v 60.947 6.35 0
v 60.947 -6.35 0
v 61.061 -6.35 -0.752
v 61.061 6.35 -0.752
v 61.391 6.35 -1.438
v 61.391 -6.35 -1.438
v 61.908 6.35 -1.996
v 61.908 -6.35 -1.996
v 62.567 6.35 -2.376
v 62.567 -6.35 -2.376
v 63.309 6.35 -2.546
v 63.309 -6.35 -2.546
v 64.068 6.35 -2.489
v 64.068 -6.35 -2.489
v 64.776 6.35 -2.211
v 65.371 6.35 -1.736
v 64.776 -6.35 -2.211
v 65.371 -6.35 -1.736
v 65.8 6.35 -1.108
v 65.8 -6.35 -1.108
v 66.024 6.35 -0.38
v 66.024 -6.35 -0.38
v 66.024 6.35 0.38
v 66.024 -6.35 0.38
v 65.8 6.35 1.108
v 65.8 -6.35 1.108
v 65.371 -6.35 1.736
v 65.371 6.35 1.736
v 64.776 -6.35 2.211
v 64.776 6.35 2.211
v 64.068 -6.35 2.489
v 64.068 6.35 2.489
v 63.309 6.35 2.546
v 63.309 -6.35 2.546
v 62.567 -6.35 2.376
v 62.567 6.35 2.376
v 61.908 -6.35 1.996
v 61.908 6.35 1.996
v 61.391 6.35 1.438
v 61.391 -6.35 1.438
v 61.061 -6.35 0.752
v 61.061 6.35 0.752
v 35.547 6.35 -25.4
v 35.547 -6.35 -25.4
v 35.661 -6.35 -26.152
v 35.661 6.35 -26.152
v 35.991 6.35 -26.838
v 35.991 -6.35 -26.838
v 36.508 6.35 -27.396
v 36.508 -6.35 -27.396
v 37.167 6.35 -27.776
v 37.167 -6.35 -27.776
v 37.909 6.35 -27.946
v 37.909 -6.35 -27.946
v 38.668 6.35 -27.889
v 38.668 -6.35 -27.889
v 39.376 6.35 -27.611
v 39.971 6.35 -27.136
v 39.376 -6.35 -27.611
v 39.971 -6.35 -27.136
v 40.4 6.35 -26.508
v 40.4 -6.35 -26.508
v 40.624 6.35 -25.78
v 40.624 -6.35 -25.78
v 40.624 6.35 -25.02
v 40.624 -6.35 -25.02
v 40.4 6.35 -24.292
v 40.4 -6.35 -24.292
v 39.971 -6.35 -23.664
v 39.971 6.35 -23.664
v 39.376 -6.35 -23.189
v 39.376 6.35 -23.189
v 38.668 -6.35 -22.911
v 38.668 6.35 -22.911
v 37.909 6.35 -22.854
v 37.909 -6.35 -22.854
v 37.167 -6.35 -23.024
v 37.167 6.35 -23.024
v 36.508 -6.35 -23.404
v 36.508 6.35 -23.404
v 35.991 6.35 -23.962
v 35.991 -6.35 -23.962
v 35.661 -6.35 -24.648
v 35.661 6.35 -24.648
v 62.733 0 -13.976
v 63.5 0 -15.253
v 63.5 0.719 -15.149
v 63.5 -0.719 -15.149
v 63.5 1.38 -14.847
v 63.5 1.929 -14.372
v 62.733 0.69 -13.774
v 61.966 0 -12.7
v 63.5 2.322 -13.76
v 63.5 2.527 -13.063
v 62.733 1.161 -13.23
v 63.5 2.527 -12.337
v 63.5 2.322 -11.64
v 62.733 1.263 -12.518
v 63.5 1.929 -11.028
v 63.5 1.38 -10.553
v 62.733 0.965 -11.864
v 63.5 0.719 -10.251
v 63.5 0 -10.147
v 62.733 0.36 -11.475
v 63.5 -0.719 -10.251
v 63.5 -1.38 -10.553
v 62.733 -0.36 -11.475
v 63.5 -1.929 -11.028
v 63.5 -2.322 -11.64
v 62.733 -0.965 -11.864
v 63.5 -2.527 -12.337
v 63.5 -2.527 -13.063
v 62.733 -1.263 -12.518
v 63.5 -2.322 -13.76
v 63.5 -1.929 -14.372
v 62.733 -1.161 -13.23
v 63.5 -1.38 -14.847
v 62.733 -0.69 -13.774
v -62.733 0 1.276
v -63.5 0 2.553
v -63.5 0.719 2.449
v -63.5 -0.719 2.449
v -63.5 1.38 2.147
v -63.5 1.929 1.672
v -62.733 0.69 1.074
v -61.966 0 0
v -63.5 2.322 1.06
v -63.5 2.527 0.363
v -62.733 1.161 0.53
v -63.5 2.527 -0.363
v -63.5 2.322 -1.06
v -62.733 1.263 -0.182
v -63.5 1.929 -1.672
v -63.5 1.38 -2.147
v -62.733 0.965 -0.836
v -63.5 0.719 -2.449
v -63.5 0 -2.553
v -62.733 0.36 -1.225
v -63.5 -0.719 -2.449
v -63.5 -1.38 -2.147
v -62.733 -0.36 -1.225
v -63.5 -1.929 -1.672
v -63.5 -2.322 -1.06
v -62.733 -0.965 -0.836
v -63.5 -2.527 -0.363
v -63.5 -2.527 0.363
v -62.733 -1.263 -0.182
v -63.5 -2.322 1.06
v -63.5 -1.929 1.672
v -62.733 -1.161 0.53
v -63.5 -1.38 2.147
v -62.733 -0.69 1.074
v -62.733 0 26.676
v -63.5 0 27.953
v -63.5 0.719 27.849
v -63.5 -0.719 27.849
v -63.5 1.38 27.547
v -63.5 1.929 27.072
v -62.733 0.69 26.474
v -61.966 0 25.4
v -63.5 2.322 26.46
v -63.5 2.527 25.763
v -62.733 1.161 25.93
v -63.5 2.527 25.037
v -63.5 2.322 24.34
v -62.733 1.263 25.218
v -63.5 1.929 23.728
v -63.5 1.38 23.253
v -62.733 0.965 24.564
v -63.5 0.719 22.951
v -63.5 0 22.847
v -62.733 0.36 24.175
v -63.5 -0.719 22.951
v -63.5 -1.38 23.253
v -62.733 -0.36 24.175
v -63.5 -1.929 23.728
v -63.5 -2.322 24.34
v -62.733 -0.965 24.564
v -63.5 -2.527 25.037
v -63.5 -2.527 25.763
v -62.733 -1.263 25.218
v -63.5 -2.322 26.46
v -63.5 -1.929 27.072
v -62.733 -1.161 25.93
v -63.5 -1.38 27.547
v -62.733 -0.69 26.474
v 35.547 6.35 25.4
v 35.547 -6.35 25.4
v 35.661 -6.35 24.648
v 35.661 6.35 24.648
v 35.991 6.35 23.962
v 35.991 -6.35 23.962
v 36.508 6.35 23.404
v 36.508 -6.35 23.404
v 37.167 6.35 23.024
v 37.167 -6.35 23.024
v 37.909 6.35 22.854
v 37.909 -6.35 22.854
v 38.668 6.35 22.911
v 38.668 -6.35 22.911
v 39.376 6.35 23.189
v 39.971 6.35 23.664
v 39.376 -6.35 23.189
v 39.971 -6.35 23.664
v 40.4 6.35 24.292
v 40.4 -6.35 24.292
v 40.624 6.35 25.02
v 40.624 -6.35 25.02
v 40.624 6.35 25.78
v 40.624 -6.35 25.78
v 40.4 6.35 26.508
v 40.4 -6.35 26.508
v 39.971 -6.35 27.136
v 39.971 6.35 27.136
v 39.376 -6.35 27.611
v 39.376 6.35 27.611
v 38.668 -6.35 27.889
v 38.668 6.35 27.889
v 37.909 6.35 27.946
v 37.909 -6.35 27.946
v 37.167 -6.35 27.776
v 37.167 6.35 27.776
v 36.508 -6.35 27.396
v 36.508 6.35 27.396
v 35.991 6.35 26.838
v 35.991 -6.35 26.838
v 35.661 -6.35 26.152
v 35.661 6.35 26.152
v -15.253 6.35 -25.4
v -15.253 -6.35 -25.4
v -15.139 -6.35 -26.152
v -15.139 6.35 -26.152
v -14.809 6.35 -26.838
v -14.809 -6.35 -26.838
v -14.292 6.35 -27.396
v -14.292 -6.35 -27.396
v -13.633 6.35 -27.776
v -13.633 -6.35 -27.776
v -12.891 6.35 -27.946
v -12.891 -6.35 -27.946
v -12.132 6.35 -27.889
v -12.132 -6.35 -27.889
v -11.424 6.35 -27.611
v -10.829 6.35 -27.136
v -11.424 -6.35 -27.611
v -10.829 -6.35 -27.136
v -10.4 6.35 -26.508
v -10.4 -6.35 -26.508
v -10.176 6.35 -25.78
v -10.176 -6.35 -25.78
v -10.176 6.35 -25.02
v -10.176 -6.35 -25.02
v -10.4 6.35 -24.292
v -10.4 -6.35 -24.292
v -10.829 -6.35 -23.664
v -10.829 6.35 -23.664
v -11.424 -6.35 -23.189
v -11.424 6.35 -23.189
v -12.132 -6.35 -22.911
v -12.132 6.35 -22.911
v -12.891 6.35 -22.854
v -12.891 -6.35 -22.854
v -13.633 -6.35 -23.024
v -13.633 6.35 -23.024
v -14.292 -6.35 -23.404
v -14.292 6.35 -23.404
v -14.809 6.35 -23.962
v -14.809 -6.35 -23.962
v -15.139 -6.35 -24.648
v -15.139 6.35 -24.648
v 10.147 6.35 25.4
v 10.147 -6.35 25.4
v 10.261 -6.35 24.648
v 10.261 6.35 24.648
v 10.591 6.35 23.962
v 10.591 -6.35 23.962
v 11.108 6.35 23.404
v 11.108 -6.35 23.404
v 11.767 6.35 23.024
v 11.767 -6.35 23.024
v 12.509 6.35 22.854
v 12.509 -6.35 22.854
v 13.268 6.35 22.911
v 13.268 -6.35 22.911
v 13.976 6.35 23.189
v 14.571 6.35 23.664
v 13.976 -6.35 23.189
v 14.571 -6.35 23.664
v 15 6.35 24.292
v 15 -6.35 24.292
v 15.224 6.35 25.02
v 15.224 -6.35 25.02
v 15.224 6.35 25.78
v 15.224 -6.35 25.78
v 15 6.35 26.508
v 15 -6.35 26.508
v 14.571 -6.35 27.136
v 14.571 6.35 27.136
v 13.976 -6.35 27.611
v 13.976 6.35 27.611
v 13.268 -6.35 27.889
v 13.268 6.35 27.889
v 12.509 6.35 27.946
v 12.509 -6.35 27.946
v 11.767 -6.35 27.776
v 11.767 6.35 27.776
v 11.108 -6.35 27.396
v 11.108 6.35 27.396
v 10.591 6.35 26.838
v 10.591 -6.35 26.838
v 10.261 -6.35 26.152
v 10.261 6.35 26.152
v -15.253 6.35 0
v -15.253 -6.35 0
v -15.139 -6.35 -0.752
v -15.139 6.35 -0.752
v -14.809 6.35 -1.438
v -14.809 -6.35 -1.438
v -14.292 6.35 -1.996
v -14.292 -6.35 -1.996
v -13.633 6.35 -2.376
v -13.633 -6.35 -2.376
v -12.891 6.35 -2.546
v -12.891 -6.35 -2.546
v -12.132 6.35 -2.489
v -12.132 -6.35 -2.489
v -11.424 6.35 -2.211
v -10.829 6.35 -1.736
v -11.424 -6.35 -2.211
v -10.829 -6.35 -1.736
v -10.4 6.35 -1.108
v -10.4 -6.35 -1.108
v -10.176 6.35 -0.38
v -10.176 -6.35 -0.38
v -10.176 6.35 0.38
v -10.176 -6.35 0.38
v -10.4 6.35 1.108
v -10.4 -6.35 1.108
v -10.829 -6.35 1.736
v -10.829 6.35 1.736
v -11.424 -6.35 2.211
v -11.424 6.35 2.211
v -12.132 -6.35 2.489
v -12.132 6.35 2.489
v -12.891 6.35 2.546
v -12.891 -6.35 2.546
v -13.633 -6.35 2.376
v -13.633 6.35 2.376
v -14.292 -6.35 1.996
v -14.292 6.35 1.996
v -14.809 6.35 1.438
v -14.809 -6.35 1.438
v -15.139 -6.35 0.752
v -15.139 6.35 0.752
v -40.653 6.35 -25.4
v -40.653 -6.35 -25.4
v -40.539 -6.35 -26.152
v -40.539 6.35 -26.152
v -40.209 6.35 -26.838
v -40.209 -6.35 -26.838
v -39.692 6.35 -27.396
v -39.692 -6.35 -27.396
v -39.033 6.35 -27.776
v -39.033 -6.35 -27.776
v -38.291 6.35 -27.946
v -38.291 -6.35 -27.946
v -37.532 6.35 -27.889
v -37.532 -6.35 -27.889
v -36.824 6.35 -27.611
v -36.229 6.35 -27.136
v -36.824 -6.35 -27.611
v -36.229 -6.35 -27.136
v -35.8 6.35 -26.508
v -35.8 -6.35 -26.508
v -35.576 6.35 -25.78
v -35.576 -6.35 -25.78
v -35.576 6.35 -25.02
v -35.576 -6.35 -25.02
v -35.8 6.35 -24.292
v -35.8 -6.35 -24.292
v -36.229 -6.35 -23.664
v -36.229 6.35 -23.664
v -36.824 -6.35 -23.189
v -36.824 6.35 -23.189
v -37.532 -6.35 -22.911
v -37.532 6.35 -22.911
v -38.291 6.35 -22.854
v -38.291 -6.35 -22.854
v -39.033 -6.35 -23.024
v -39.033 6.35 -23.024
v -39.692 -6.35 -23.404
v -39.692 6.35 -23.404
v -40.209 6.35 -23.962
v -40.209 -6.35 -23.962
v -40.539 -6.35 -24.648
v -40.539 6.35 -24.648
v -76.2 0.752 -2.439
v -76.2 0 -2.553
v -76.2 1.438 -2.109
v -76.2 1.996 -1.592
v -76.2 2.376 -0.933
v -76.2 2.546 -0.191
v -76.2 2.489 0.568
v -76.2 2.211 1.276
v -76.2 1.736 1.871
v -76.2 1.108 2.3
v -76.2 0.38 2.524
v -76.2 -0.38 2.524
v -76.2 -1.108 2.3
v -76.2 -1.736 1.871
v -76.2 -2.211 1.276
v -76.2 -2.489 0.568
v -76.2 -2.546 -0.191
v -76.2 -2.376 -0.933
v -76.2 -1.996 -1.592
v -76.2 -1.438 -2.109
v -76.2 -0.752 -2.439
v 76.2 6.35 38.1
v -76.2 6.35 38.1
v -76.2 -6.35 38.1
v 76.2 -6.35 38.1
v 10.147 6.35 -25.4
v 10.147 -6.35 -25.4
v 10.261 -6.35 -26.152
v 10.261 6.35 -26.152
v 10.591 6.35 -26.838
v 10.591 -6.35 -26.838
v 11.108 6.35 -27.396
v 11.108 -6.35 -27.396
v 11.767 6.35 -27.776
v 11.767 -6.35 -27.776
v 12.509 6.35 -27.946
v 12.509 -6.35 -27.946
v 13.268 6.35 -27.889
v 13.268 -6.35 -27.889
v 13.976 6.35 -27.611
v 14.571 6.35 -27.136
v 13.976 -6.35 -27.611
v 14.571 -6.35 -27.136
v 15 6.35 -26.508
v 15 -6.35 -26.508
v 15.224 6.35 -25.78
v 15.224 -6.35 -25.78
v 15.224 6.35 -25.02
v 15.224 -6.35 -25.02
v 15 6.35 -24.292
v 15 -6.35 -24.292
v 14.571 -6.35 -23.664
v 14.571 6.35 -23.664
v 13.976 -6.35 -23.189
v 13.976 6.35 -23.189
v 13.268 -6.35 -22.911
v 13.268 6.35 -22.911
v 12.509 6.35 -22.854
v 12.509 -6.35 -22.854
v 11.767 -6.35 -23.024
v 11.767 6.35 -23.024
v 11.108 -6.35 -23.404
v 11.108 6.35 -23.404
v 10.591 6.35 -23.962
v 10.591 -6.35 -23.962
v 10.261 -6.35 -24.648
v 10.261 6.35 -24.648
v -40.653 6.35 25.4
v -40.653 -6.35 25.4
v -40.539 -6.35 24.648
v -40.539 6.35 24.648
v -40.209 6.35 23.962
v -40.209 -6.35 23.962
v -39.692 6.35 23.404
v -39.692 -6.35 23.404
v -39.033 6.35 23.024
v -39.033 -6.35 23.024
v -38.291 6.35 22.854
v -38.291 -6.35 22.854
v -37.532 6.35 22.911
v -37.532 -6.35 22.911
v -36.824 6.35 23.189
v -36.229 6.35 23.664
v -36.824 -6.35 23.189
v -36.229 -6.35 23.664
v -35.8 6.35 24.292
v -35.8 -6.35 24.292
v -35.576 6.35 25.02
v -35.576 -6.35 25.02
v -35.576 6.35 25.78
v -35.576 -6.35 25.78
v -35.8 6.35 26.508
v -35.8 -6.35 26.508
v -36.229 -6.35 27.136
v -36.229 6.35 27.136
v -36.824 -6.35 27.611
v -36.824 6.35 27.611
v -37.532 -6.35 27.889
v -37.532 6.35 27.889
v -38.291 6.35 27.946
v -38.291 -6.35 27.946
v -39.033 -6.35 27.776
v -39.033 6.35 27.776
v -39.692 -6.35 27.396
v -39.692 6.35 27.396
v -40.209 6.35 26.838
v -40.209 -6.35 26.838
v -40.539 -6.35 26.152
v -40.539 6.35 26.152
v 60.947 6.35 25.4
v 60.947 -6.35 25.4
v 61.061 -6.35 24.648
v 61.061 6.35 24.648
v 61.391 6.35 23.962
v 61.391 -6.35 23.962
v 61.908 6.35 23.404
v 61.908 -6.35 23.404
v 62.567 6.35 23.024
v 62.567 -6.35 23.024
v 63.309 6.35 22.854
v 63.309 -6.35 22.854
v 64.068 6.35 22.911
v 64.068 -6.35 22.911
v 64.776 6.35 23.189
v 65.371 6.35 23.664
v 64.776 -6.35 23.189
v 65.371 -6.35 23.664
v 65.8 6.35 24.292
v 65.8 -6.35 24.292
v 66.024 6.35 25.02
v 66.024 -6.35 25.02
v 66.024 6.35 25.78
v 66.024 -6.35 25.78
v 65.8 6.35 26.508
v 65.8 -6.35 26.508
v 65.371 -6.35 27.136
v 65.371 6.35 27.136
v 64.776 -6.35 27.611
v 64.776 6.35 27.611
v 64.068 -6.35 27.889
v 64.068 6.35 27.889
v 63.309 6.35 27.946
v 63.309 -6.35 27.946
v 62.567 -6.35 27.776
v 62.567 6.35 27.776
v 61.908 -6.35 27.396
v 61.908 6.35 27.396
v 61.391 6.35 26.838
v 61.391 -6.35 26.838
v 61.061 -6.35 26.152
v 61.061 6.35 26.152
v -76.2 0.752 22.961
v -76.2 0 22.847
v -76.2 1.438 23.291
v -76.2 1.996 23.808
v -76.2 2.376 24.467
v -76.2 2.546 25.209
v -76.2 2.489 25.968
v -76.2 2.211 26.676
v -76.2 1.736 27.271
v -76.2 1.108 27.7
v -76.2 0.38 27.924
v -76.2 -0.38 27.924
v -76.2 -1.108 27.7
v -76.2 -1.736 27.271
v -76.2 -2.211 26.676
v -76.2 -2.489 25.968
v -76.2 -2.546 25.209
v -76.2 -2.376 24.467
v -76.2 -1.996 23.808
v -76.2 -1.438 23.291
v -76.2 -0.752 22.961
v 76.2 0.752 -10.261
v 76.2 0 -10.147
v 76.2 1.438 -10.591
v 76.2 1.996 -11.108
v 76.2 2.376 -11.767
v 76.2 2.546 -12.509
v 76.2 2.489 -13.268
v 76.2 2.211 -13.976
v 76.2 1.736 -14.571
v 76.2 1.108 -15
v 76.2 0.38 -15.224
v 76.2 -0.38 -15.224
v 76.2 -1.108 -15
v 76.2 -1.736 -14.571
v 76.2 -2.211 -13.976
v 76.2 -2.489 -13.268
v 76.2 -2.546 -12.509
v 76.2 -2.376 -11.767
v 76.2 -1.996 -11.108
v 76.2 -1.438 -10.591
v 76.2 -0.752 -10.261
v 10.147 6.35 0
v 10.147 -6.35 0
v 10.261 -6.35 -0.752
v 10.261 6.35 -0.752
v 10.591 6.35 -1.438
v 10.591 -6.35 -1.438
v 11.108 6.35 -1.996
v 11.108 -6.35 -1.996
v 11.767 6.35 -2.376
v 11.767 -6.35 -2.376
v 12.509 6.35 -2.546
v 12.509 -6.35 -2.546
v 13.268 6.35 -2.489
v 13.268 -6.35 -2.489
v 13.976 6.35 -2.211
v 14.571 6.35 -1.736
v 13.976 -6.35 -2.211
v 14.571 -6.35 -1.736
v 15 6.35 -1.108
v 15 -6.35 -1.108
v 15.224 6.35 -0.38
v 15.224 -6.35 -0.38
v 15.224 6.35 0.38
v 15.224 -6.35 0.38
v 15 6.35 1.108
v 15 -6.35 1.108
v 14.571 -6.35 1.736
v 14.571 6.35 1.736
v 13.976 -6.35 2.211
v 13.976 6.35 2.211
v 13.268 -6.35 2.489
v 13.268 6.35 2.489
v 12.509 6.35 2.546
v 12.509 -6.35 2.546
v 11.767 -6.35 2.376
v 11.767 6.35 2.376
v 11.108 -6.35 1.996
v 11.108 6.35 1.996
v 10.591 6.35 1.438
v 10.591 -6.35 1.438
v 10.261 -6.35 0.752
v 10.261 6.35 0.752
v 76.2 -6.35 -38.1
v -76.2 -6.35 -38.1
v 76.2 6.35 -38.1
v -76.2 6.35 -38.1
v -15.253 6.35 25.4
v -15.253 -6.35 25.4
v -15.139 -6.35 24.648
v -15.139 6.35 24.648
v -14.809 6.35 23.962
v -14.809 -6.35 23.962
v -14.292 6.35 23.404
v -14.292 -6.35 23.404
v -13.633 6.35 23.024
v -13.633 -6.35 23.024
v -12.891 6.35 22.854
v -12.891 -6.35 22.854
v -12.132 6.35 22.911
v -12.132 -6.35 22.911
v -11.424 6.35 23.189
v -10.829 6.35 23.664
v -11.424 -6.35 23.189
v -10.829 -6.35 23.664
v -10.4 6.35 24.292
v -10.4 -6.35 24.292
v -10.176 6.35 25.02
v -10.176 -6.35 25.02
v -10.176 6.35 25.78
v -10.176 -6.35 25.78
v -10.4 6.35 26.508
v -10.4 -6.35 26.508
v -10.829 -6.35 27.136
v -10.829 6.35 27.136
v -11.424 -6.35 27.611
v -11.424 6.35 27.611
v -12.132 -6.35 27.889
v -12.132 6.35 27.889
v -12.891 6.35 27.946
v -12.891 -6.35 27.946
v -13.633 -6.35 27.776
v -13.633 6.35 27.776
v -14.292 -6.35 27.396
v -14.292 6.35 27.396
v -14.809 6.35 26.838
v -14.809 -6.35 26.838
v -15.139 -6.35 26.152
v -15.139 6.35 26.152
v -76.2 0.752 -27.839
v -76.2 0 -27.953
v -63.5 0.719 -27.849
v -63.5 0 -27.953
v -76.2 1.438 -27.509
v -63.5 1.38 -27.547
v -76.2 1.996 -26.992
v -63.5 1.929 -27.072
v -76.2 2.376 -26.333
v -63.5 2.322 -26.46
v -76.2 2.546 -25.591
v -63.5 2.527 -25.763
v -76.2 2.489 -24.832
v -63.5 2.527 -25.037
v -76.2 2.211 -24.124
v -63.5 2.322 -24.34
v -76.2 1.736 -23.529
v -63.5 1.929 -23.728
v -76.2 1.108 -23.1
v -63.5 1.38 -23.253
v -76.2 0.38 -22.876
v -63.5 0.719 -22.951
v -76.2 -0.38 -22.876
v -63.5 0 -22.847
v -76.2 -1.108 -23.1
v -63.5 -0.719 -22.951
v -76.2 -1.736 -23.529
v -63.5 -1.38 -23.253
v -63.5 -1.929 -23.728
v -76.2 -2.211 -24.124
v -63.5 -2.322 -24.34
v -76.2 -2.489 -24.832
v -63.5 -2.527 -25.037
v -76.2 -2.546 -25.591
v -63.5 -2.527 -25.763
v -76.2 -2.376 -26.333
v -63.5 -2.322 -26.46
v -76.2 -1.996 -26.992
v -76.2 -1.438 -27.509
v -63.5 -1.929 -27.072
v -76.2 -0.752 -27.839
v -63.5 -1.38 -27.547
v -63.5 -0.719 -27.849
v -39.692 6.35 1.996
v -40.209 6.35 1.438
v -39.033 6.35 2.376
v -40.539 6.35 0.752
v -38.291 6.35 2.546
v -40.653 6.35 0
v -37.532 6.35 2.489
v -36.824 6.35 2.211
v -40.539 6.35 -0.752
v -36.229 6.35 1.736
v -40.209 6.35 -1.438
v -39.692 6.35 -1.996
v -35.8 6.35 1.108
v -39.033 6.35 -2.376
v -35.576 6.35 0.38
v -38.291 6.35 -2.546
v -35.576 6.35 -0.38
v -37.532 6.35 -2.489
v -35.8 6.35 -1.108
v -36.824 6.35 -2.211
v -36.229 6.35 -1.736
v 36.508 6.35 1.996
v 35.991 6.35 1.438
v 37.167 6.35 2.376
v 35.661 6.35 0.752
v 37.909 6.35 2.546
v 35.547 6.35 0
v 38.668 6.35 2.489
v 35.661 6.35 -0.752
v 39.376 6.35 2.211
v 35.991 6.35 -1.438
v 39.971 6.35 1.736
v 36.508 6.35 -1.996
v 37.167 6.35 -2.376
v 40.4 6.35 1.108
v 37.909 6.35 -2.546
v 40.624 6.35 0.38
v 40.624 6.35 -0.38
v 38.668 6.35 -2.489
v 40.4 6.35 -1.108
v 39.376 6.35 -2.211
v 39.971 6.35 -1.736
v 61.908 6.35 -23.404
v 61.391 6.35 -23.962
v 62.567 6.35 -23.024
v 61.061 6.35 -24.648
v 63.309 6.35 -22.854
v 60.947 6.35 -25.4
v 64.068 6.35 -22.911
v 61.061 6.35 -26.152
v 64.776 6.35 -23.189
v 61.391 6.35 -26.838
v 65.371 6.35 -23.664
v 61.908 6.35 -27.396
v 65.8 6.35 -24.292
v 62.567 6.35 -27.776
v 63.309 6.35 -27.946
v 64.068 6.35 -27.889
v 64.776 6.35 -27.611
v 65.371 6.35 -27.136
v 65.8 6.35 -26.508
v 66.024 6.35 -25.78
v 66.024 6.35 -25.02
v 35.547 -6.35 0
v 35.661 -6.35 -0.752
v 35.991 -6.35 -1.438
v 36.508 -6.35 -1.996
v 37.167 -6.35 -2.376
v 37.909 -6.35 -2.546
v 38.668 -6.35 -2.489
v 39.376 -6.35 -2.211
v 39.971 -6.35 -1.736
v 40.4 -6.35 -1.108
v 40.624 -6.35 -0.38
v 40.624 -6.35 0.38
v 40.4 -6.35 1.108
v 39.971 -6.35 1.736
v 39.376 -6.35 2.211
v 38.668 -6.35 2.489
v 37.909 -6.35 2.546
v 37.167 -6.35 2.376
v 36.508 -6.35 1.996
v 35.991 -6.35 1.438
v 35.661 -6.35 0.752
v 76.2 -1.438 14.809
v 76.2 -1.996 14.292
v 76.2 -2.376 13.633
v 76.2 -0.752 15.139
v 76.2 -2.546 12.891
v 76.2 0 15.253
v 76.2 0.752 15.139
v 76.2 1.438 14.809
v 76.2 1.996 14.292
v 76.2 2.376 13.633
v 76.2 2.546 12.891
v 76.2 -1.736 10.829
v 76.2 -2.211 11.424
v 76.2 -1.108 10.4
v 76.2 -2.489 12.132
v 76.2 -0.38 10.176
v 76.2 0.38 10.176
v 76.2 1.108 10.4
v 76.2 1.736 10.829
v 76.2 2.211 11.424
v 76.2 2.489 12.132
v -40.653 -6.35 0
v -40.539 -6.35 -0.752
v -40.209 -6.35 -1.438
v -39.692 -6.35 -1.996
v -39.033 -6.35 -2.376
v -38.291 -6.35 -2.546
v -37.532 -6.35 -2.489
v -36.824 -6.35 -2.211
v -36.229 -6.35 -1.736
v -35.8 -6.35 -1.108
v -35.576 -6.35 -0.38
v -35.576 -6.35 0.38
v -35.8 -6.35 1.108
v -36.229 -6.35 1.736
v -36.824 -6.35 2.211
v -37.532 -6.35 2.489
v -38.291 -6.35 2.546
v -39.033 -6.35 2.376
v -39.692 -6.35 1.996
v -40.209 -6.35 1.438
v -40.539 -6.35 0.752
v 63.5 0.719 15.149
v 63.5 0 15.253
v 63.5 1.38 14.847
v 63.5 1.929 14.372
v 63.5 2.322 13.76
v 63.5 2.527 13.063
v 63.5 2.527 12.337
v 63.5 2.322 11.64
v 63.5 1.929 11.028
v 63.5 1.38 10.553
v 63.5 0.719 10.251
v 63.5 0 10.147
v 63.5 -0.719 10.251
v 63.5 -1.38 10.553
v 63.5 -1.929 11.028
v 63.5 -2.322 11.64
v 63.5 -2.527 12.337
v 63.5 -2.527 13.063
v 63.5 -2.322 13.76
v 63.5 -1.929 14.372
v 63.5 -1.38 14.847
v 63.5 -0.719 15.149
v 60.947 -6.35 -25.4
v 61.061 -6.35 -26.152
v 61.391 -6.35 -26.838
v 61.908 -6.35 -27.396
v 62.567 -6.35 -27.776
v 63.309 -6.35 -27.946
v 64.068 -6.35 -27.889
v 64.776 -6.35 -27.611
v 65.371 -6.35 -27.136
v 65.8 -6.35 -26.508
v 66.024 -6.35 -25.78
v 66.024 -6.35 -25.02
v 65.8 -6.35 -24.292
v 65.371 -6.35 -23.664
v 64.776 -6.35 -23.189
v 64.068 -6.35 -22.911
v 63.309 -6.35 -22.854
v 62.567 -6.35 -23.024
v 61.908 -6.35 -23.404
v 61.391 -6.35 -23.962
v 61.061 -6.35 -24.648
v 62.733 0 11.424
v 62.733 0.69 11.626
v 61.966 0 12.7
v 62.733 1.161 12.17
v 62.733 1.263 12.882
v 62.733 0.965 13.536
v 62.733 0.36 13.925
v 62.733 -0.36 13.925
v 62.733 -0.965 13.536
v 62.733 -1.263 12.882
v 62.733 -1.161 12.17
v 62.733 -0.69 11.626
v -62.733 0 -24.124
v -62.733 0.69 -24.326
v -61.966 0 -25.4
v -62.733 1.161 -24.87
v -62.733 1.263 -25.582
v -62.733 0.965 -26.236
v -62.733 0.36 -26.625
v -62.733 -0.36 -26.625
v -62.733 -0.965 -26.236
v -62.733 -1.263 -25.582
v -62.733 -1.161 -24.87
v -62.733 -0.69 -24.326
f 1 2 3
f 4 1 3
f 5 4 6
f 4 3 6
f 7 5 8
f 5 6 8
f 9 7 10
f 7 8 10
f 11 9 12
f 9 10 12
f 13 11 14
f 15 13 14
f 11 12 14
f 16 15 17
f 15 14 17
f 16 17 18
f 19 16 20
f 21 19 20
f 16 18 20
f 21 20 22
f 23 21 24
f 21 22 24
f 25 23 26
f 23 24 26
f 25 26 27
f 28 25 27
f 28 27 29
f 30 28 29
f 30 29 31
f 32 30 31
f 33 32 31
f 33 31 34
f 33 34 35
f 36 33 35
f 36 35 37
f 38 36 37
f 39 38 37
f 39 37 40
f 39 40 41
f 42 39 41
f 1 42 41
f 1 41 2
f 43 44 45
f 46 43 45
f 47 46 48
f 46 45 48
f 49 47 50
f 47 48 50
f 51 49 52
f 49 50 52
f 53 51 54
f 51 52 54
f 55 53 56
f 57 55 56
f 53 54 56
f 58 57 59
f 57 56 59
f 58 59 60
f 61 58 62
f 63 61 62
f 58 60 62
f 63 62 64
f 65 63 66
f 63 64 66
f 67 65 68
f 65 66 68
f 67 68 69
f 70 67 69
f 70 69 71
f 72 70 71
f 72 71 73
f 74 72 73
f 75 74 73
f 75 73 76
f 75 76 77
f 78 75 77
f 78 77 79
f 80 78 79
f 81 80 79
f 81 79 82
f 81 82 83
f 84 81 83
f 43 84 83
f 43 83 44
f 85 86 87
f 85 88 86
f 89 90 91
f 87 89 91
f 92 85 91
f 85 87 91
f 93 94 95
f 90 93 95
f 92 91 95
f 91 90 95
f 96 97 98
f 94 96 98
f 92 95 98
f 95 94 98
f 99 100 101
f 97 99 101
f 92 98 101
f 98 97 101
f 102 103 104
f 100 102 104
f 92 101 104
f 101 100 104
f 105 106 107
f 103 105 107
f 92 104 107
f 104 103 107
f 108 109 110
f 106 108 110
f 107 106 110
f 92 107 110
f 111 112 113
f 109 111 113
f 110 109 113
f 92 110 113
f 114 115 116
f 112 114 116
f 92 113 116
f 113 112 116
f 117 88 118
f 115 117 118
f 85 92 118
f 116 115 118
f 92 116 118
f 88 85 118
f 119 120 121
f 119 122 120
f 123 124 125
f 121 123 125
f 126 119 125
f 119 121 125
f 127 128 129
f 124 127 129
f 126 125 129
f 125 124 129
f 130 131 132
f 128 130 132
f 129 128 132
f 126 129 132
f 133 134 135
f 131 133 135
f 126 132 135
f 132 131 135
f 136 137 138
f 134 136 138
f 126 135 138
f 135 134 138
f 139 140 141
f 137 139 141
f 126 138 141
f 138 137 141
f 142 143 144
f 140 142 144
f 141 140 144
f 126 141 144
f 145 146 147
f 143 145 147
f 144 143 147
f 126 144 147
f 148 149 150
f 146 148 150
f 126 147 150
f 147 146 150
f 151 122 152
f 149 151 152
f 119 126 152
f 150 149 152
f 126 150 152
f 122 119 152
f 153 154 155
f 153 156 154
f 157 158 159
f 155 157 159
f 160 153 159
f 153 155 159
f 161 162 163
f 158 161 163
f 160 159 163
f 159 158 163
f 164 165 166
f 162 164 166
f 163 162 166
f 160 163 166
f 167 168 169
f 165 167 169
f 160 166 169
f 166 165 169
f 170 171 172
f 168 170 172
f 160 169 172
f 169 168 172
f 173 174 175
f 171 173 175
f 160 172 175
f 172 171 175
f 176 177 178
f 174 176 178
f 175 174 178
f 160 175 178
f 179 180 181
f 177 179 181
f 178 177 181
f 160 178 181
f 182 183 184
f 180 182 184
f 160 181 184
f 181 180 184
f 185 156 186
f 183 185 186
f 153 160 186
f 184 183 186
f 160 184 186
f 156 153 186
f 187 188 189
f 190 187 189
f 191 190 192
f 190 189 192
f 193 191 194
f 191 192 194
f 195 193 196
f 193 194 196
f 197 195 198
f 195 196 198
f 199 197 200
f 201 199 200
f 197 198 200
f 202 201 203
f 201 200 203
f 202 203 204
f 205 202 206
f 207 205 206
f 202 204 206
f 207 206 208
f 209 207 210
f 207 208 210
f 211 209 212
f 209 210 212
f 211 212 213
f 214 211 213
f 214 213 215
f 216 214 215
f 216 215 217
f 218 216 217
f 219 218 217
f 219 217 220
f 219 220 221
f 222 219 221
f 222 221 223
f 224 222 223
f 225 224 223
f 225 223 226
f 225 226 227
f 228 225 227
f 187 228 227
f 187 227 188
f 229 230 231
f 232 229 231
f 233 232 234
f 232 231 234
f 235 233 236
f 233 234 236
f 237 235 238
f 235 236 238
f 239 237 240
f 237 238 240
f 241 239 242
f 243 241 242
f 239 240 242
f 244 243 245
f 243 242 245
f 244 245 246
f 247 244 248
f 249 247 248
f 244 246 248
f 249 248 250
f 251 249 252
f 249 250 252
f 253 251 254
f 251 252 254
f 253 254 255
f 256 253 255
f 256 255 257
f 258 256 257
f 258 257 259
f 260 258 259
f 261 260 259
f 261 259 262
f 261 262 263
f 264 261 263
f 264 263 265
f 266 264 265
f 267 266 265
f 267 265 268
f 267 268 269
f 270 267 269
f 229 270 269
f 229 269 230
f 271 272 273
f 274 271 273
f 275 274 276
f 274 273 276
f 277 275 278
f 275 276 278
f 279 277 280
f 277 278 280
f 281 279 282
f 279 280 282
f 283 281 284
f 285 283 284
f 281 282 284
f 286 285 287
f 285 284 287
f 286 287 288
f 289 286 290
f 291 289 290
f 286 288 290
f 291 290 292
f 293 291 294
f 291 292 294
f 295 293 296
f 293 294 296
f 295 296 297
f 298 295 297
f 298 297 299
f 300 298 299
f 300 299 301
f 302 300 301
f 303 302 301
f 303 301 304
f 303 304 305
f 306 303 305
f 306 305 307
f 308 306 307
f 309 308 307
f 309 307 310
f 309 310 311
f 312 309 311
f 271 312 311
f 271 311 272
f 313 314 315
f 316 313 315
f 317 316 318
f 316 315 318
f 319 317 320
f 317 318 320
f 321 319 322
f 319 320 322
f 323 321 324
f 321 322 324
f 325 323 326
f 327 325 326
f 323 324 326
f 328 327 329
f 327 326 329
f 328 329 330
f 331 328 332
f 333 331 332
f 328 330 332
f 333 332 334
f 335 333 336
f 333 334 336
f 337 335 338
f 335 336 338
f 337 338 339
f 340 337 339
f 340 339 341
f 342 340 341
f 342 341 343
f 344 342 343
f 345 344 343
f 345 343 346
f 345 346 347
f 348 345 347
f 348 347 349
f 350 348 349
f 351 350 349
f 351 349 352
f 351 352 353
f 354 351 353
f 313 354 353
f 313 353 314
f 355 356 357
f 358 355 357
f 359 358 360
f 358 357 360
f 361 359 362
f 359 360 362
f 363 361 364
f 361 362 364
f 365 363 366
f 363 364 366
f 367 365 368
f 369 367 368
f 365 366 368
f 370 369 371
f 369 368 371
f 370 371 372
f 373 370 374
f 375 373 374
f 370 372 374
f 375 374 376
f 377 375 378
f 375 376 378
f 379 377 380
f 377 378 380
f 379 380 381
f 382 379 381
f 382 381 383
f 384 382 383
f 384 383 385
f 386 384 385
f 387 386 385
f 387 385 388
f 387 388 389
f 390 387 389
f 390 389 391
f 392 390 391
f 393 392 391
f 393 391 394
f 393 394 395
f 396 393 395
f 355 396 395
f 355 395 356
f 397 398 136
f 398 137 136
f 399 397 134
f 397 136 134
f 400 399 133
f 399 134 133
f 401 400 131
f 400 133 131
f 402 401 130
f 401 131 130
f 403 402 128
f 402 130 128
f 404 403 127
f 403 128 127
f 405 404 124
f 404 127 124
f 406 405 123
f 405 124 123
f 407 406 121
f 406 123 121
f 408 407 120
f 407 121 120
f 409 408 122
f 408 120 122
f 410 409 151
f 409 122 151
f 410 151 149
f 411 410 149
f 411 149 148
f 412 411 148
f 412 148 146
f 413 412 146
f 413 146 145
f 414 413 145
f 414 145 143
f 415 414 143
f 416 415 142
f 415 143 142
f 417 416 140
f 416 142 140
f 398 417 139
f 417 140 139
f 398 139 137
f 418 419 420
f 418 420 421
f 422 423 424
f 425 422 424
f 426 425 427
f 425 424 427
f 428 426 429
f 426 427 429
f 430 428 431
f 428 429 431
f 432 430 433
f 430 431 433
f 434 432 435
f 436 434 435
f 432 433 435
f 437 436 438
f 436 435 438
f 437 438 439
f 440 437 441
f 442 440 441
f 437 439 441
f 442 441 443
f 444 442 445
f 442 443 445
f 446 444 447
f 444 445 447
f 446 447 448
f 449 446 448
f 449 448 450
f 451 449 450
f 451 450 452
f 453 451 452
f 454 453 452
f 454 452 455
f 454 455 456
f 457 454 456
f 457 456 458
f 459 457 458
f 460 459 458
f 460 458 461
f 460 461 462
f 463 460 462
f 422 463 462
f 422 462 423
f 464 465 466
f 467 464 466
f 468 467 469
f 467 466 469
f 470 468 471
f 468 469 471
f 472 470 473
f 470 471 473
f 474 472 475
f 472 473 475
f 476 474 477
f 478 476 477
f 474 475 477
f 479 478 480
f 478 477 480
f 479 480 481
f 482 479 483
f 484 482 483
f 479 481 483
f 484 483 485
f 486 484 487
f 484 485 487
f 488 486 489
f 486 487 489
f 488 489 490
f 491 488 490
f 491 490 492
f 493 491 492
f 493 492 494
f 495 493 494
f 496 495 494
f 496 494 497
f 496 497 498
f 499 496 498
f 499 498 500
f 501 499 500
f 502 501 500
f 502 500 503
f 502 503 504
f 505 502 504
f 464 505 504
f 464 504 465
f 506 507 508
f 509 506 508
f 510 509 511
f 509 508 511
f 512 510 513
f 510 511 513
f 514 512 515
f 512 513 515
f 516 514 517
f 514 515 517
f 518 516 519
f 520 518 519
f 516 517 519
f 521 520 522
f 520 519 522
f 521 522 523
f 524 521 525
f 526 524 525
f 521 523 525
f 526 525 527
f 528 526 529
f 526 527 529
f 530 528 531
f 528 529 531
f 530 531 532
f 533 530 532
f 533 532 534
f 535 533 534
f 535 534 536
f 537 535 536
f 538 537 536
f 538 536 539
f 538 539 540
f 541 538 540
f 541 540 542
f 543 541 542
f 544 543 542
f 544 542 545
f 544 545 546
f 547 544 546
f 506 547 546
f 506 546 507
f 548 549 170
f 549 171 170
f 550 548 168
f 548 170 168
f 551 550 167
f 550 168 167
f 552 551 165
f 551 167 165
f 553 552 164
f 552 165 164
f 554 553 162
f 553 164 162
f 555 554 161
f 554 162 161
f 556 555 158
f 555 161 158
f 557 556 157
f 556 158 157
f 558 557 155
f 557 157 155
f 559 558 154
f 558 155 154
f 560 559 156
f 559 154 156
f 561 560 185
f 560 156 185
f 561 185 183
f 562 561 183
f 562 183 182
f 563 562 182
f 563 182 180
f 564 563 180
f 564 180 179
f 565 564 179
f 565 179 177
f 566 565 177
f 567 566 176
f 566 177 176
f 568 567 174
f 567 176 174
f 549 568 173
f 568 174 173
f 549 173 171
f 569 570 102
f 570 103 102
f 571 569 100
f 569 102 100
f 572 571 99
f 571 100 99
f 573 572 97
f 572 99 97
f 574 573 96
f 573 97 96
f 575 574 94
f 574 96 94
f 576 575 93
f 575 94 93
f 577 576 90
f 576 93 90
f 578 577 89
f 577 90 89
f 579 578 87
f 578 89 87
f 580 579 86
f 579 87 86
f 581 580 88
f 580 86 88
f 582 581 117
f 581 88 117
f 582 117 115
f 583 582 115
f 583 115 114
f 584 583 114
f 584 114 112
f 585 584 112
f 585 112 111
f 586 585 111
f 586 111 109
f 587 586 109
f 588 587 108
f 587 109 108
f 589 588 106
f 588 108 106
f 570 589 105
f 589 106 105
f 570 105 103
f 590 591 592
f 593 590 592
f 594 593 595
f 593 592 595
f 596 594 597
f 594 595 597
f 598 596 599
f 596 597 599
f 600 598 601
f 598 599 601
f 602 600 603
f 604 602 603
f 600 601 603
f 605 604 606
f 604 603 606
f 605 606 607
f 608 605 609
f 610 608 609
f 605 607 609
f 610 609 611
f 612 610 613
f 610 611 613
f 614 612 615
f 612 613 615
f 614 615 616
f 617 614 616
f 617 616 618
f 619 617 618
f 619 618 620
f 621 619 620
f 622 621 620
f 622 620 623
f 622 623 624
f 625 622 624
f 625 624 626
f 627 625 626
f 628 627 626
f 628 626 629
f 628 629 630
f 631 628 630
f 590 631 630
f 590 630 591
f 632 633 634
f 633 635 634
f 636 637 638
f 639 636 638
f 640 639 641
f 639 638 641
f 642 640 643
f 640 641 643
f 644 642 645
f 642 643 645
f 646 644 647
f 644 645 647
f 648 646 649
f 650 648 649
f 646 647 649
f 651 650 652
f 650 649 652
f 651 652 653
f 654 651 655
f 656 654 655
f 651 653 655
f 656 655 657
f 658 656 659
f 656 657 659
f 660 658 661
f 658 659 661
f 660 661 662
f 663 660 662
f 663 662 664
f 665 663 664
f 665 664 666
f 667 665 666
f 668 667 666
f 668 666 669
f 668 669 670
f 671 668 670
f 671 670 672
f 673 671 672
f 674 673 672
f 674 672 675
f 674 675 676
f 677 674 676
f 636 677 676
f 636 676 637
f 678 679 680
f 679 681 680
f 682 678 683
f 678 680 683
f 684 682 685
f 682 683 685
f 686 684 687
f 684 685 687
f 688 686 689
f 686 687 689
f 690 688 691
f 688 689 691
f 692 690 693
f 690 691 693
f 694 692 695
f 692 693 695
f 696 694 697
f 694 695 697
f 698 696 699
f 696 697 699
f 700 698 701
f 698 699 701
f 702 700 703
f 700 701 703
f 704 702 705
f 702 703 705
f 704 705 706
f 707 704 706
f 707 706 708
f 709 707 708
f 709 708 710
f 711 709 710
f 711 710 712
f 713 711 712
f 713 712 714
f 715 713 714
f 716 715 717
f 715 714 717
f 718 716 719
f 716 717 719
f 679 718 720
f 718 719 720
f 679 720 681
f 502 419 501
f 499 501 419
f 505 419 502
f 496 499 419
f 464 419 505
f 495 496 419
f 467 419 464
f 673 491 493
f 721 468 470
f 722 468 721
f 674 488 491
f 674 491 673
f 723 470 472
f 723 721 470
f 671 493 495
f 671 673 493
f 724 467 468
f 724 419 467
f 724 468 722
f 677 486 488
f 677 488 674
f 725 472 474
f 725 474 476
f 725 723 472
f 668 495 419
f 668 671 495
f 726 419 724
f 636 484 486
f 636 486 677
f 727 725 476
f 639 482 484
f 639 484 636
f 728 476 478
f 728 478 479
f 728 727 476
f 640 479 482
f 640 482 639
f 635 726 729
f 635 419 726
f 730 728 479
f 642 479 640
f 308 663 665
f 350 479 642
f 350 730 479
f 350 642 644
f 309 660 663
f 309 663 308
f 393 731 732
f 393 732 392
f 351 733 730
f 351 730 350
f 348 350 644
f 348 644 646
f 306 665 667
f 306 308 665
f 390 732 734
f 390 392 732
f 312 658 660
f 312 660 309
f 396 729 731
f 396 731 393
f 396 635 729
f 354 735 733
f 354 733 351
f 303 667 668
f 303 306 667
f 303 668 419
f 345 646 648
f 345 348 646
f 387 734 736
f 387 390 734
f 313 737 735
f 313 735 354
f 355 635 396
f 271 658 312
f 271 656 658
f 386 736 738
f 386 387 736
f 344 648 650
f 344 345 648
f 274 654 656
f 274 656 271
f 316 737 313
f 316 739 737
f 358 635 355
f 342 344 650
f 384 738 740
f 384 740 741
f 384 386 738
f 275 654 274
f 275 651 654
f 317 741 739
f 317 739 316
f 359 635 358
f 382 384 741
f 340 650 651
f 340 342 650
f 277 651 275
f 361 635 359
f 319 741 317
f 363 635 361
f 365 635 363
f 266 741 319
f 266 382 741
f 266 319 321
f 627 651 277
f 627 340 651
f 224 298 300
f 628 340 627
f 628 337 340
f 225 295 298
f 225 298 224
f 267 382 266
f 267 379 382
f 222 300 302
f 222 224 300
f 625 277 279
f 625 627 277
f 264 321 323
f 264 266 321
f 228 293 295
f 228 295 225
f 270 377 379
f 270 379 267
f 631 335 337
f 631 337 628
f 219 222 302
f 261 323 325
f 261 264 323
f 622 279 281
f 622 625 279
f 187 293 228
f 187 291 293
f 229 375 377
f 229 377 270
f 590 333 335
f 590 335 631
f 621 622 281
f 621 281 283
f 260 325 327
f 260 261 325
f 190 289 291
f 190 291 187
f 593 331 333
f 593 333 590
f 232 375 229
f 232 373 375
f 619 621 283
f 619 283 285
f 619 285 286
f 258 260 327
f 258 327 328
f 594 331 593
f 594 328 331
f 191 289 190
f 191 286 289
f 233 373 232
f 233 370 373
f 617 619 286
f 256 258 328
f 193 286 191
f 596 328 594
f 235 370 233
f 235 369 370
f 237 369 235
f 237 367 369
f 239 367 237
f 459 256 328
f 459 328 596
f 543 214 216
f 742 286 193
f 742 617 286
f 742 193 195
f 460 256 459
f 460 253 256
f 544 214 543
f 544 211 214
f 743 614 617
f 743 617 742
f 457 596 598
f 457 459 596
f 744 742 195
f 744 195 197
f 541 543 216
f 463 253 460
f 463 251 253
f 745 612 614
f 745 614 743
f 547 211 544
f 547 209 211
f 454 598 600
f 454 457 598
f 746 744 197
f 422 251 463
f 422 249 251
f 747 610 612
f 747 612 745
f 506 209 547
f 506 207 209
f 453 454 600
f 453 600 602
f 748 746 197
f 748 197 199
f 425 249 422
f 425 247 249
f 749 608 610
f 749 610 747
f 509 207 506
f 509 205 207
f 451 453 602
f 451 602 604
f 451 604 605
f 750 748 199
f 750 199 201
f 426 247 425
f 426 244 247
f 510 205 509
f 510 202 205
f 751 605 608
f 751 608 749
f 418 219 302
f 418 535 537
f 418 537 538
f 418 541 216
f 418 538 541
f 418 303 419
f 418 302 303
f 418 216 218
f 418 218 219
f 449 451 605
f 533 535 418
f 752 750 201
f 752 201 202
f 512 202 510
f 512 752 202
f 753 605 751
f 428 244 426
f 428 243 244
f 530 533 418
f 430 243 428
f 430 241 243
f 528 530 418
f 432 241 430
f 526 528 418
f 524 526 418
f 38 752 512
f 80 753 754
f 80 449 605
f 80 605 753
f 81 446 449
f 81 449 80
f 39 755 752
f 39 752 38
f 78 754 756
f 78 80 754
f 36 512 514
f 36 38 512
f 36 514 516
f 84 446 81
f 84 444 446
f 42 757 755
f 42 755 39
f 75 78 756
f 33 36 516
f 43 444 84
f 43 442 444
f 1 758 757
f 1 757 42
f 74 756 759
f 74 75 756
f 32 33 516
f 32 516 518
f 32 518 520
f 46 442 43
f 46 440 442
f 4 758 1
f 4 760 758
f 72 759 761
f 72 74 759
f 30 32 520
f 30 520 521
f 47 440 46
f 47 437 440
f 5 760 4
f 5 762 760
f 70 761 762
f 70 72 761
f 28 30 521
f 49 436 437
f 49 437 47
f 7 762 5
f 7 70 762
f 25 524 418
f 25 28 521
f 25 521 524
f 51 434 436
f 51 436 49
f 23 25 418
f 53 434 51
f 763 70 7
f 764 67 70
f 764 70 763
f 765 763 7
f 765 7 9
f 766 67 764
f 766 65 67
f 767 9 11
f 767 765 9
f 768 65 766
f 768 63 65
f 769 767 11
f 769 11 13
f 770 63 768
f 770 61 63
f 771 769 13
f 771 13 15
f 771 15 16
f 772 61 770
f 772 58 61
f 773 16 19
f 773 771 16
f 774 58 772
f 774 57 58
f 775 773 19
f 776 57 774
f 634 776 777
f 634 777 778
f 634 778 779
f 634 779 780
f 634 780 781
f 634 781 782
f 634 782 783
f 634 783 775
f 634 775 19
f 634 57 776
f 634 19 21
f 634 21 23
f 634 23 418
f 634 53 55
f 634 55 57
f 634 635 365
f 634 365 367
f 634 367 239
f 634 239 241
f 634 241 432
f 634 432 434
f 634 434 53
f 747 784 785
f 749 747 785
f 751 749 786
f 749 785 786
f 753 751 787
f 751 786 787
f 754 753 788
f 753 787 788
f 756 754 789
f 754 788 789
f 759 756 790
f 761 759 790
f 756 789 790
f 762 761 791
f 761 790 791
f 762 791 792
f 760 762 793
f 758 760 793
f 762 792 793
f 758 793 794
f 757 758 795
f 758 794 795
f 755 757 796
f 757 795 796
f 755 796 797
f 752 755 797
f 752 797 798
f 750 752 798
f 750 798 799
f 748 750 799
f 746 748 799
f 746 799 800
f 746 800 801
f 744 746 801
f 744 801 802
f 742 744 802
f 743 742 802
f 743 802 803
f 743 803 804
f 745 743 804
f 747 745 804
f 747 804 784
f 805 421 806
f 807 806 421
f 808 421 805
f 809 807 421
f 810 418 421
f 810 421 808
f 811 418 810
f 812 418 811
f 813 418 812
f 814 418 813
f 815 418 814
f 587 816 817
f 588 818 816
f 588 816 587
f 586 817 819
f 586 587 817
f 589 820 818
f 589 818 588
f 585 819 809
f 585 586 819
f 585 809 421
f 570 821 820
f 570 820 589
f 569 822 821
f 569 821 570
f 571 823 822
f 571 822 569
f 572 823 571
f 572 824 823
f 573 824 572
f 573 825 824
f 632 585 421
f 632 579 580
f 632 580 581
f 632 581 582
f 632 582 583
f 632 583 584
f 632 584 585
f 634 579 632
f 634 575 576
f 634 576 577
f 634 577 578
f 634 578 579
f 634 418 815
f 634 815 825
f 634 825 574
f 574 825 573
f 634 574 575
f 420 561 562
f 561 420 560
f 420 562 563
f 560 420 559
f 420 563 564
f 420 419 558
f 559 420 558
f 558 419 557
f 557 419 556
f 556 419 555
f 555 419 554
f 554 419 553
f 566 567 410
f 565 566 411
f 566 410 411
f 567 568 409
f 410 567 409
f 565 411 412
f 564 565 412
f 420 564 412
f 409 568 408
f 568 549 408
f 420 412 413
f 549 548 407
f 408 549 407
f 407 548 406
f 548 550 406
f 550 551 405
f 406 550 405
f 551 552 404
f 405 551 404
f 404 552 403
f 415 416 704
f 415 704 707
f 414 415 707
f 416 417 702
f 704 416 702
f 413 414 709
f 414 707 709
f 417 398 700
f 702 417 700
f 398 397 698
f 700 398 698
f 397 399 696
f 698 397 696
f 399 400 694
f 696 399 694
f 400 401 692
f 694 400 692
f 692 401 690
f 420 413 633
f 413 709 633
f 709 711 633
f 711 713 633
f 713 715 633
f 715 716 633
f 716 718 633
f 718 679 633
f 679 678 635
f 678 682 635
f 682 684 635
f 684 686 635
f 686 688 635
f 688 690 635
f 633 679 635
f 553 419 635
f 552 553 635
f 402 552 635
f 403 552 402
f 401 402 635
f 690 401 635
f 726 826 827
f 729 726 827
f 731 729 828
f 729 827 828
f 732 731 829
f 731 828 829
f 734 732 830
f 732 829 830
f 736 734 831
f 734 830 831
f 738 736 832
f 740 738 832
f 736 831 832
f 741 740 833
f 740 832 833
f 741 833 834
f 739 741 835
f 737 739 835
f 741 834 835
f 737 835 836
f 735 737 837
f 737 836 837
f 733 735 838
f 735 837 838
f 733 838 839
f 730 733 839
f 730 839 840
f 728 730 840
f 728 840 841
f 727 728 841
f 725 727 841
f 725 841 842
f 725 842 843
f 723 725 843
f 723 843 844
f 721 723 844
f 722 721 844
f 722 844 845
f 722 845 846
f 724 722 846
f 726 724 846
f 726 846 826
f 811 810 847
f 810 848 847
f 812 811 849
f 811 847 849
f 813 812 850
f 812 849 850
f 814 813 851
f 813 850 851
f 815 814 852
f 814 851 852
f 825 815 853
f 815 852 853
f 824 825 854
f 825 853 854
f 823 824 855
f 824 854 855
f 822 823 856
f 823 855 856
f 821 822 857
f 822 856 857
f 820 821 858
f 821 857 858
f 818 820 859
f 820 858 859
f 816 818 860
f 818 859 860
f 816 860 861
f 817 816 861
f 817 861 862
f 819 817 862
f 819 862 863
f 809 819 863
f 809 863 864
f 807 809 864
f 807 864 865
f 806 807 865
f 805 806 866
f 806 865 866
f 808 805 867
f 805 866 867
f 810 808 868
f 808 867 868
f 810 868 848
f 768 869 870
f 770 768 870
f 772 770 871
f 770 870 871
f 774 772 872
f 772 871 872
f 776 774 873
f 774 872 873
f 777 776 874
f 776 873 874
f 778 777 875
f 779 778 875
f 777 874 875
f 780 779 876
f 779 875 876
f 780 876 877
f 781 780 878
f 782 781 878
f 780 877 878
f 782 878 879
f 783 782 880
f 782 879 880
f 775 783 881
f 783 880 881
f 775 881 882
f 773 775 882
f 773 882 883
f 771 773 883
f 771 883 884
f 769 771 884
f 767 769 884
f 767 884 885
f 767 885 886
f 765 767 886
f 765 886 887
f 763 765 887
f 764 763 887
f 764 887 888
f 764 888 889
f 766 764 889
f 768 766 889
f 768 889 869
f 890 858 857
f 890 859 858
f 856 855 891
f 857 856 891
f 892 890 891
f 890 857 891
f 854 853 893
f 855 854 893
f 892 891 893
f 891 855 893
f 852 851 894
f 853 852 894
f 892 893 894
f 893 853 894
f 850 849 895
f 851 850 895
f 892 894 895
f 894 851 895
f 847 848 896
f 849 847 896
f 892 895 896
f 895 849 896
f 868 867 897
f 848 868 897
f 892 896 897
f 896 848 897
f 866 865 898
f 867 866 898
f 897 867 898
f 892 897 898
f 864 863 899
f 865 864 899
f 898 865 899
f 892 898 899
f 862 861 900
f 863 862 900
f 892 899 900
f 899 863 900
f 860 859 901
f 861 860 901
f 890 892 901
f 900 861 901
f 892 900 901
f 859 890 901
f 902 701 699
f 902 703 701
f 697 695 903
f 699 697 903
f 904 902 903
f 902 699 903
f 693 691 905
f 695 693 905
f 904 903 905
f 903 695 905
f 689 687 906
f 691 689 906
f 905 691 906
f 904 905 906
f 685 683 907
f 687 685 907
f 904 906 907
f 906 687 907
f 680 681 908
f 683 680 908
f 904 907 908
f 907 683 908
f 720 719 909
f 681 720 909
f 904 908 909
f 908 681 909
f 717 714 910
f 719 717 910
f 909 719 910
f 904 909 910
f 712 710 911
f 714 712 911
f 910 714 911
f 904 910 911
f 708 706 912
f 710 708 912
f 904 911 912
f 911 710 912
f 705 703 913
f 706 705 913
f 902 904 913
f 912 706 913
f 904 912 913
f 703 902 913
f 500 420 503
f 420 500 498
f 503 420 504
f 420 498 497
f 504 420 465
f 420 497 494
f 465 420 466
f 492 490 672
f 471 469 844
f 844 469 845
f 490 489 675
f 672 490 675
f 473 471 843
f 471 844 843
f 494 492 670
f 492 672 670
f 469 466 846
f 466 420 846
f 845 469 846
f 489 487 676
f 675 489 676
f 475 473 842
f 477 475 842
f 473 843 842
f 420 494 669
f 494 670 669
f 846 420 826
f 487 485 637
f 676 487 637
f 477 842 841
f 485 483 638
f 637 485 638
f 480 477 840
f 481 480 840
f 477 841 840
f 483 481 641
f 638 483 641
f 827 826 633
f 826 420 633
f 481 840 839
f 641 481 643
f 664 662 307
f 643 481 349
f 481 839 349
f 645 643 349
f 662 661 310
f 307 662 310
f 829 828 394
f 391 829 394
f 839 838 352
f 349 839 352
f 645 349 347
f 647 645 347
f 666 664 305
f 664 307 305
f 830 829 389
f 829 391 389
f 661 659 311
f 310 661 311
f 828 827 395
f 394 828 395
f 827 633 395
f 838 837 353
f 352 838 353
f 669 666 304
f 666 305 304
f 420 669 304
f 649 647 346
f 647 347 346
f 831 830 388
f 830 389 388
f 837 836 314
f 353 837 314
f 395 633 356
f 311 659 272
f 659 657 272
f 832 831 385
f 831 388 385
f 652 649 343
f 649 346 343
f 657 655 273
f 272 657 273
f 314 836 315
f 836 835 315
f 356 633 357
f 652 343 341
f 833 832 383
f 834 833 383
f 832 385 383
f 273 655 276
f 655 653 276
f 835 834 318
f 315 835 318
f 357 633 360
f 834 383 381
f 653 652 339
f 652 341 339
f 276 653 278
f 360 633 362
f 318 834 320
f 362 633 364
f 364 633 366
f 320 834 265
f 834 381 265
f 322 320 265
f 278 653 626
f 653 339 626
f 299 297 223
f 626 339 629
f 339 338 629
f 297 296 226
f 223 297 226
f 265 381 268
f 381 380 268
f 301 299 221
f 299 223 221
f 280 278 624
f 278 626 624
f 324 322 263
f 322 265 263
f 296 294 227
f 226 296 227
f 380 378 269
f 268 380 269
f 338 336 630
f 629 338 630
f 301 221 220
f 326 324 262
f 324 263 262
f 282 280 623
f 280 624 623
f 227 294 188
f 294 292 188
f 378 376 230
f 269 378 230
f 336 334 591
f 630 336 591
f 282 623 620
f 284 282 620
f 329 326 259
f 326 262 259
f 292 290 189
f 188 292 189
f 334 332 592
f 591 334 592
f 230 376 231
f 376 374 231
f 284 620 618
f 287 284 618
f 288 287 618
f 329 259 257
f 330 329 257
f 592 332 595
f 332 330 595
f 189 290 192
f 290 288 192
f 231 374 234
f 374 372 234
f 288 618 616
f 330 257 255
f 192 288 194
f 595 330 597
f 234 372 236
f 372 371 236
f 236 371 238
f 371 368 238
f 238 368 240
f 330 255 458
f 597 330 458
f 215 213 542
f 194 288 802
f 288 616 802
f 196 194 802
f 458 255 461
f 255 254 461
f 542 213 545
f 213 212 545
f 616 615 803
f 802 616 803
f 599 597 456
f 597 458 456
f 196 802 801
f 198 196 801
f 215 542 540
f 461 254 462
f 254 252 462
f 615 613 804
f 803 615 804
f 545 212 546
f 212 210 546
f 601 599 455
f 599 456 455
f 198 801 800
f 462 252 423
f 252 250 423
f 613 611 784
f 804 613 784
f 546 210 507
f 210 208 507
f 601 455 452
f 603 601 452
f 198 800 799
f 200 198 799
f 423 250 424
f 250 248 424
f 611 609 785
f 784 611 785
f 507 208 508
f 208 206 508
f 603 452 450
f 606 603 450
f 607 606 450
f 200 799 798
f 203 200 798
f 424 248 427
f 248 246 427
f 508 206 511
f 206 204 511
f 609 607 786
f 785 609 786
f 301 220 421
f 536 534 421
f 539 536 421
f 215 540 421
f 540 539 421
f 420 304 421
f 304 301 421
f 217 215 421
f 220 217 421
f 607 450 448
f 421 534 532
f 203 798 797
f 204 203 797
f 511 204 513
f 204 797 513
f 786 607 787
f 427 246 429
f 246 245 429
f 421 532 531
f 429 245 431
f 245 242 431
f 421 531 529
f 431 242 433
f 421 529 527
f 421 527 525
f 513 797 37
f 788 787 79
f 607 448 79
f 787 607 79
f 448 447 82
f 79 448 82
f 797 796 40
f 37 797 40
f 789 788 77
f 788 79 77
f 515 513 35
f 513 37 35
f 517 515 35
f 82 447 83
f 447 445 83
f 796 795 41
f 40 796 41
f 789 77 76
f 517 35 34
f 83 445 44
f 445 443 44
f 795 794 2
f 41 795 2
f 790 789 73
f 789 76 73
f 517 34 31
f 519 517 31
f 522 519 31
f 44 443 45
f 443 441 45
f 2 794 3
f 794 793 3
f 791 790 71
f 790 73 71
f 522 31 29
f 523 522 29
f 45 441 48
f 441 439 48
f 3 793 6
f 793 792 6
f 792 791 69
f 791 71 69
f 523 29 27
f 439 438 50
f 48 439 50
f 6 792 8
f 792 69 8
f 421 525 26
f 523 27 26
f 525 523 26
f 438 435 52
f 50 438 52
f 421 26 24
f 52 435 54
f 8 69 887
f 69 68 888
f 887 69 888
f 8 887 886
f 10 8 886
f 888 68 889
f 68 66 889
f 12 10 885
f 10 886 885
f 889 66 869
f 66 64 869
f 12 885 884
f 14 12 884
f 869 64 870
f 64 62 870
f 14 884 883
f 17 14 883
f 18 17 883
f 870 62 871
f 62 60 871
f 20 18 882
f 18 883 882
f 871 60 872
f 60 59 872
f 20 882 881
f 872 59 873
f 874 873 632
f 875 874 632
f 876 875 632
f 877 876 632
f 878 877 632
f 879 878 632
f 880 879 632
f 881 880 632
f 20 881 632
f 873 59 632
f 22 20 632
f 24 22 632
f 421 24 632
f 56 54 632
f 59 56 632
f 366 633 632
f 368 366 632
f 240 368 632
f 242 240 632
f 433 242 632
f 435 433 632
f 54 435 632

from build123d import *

# Parameters (mm, degrees)
SKETCH1_W                       = 152.4
SKETCH1_H                       = 76.2
BOSS_EXTRUDE1_DEPTH             = 6.35
TAP_DRILL_FOR_1_4_20_TAP1_D     = 5.1054
TAP_DRILL_FOR_1_4_20_TAP2_D     = 5.1054
TAP_DRILL_FOR_1_4_20_TAP2_DEPTH = 12.7
TAP_DRILL_FOR_1_4_20_TAP2_TIP   = 1.533816902
TAP_DRILL_FOR_1_4_20_TAP3_D     = 5.1054
TAP_DRILL_FOR_1_4_20_TAP3_DEPTH = 12.7
TAP_DRILL_FOR_1_4_20_TAP3_TIP   = 1.533816902


with BuildPart() as part:
    # Sketch1 → Boss-Extrude1 (new, symmetric)
    with BuildSketch(Plane(origin=(0, 0, 0), x_dir=(1, 0, 0), z_dir=(0, 1, 0))):
        Rectangle(SKETCH1_W, SKETCH1_H)
    extrude(amount=BOSS_EXTRUDE1_DEPTH, both=True)

    # Tap Drill for 1/4-20 Tap1 (through all)
    with Locations(Plane(origin=(0, 6.35, 0), x_dir=(1, 0, 0), z_dir=(0, 1, 0))):
        with Locations((63.5, 25.4), (38.1, 25.4), (12.7, 25.4), (38.1, 0), (12.7, 0), (38.1, -25.4), (12.7, -25.4), (63.5, 0), (63.5, -25.4), (-12.7, 25.4), (-38.1, 25.4), (-12.7, 0), (-38.1, 0), (-12.7, -25.4), (-38.1, -25.4)):
            Hole(TAP_DRILL_FOR_1_4_20_TAP1_D / 2)

    # Tap Drill for 1/4-20 Tap2
    with Locations(Plane.ZY.offset(76.2)):
        with Locations((-25.4, 0), (0, 0), (25.4, 0)):
            Hole(TAP_DRILL_FOR_1_4_20_TAP2_D / 2, depth=TAP_DRILL_FOR_1_4_20_TAP2_DEPTH)
            with Locations((0, 0, -(TAP_DRILL_FOR_1_4_20_TAP2_DEPTH + TAP_DRILL_FOR_1_4_20_TAP2_TIP / 2))):  # 118° drill point
                Cone(0, TAP_DRILL_FOR_1_4_20_TAP2_D / 2, TAP_DRILL_FOR_1_4_20_TAP2_TIP, mode=Mode.SUBTRACT)

    # Tap Drill for 1/4-20 Tap3
    with Locations(Plane(origin=(76.2, 0, 0), x_dir=(0, 0, -1), z_dir=(1, 0, 0))):
        with Locations((12.7, 0), (-12.7, 0)):
            Hole(TAP_DRILL_FOR_1_4_20_TAP3_D / 2, depth=TAP_DRILL_FOR_1_4_20_TAP3_DEPTH)
            with Locations((0, 0, -(TAP_DRILL_FOR_1_4_20_TAP3_DEPTH + TAP_DRILL_FOR_1_4_20_TAP3_TIP / 2))):  # 118° drill point
                Cone(0, TAP_DRILL_FOR_1_4_20_TAP3_D / 2, TAP_DRILL_FOR_1_4_20_TAP3_TIP, mode=Mode.SUBTRACT)


solid = part.part
